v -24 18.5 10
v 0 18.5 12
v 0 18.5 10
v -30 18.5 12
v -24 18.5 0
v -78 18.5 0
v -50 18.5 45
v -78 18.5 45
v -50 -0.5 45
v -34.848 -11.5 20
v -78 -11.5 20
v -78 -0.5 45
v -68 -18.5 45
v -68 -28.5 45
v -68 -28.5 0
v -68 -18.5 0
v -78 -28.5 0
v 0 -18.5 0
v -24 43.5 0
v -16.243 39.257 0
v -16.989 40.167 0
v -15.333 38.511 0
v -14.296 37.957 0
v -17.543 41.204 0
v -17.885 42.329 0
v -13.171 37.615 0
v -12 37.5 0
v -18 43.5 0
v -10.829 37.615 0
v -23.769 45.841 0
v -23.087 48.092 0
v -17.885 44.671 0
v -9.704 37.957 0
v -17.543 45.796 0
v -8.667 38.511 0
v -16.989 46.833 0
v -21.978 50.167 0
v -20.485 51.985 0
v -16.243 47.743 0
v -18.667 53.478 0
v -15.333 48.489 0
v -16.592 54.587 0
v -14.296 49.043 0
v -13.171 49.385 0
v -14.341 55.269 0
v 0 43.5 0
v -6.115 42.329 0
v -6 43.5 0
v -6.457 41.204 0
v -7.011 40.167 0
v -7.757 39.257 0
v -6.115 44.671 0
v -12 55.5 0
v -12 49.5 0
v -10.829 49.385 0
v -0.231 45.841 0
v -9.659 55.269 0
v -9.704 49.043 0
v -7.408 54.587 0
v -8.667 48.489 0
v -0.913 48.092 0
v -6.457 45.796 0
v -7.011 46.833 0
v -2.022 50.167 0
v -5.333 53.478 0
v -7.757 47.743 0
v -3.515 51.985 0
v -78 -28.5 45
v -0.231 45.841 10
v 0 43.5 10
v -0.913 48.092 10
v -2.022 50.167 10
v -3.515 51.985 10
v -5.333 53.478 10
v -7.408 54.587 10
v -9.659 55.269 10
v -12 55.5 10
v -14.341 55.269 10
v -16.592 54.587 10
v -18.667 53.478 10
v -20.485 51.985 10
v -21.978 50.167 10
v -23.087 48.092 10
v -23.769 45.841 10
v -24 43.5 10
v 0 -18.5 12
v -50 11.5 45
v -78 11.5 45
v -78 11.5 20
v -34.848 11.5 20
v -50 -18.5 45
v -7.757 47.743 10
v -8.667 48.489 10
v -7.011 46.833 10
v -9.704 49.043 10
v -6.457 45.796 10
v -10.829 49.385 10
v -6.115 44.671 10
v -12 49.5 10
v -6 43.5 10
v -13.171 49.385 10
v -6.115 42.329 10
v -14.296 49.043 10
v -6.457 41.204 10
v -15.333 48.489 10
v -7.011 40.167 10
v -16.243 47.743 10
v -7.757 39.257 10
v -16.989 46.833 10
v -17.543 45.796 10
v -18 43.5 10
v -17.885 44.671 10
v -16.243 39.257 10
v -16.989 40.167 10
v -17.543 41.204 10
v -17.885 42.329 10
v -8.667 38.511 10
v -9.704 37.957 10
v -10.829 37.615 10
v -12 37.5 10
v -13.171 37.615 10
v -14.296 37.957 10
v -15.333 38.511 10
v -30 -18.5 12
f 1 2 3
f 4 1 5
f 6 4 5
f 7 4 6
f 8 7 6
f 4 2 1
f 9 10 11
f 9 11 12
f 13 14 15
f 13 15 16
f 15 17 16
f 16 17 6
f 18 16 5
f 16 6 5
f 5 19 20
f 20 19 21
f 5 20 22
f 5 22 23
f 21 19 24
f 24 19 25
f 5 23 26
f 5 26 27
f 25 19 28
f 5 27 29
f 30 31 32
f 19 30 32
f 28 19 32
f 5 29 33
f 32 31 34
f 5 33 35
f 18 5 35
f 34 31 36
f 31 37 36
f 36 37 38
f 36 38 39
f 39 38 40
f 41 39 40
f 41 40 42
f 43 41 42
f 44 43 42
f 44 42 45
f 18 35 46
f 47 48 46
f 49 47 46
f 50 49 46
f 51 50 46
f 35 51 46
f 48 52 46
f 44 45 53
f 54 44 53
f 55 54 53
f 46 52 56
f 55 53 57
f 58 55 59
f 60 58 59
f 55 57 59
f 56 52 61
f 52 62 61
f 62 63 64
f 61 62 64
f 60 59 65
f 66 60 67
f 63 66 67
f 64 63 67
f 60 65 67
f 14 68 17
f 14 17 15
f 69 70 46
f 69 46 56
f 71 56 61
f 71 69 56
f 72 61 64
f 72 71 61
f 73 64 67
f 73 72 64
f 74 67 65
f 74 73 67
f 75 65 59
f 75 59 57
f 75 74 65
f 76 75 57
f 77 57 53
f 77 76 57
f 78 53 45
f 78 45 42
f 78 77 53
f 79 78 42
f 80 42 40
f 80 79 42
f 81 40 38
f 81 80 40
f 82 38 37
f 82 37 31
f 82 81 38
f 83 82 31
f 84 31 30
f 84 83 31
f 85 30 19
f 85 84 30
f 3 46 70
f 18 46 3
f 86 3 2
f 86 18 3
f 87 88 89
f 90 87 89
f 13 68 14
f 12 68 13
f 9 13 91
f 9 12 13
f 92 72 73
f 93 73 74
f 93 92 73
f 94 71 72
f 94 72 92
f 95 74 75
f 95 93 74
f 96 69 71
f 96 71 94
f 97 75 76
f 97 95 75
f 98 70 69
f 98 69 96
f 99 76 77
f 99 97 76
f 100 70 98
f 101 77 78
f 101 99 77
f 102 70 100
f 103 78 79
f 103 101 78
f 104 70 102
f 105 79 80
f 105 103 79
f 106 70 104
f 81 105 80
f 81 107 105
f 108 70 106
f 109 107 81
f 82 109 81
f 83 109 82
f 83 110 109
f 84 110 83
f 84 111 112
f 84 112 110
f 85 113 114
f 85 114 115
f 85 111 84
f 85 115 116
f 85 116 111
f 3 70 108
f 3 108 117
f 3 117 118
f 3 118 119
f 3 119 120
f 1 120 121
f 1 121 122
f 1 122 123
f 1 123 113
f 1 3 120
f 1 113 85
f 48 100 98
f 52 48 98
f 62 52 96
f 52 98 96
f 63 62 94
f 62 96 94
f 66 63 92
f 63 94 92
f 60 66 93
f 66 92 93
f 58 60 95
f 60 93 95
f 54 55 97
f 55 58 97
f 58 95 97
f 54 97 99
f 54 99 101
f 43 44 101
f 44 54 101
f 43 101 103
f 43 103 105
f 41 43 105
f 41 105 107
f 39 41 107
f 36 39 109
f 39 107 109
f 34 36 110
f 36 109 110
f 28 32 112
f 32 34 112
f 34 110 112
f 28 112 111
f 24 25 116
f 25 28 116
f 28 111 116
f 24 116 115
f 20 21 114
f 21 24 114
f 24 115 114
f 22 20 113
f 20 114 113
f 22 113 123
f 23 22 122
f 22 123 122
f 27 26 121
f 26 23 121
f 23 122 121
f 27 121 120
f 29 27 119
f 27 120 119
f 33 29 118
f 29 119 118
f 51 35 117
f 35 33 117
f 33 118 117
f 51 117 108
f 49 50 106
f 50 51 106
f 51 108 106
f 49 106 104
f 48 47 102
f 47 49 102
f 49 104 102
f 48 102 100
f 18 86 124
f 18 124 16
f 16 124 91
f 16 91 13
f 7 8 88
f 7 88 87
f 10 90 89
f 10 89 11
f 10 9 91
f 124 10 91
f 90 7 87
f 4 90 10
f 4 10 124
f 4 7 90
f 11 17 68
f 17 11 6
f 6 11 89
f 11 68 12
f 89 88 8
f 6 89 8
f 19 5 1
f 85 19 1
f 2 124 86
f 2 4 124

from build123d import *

# Parameters (mm, degrees)
BOSS_EXTRUDE1_DEPTH = 18.5
CUT_EXTRUDE1_DEPTH  = 92.930680406
SKETCH3_W           = 24
SKETCH3_H           = 10
BOSS_EXTRUDE2_DEPTH = 25
SKETCH4_R           = 12
SKETCH4_R_2         = 6
BOSS_EXTRUDE4_DEPTH = 10
SKETCH5_R           = 6
CUT_EXTRUDE2_DEPTH  = 102.927670433
SKETCH6_W           = 10
SKETCH6_H           = 10
BOSS_EXTRUDE5_DEPTH = 45


with BuildPart() as part:
    # Sketch1 → Boss-Extrude1 (new, symmetric)
    with BuildSketch(Plane(origin=(0, 0, 0), x_dir=(-1, 0, 0), z_dir=(0, 1, 0))):
        Polygon((0, 0), (78, 0), (78, 45), (50, 45), (30, 12), (0, 12), align=None)
    extrude(amount=BOSS_EXTRUDE1_DEPTH, both=True)

    # Sketch2 → Cut-Extrude1 (cut, through all)
    with BuildSketch(Plane(origin=(-78, 0, 0), x_dir=(0, -1, 0), z_dir=(-1, 0, 0))):
        Polygon((0.5, 45), (-11.5, 45), (-11.5, 20), (11.5, 20), align=None)
    extrude(amount=-CUT_EXTRUDE1_DEPTH, mode=Mode.SUBTRACT)

    # Sketch3 → Boss-Extrude2 (add)
    with BuildSketch(Plane(origin=(0, 18.5, 0), x_dir=(-1, 0, 0), z_dir=(0, 1, 0))):
        with Locations((12, 5)):
            Rectangle(SKETCH3_W, SKETCH3_H)
    extrude(amount=BOSS_EXTRUDE2_DEPTH)

    # Sketch4 → Boss-Extrude4 (add)
    with BuildSketch(Plane.XY.offset(10)):
        with Locations((-12, 43.5)):
            Circle(SKETCH4_R)
        with Locations((-12, 43.5)):
            Circle(SKETCH4_R_2, mode=Mode.SUBTRACT)
    extrude(amount=-BOSS_EXTRUDE4_DEPTH)

    # Sketch5 → Cut-Extrude2 (cut, through all)
    with BuildSketch(Plane.XY.offset(10)):
        with Locations((-12, 43.5)):
            Circle(SKETCH5_R)
    extrude(amount=-CUT_EXTRUDE2_DEPTH, mode=Mode.SUBTRACT)

    # Sketch6 → Boss-Extrude5 (add)
    with BuildSketch(Plane.XY.offset(45)):
        with Locations((-73, -23.5)):
            Rectangle(SKETCH6_W, SKETCH6_H)
    extrude(amount=-BOSS_EXTRUDE5_DEPTH)


solid = part.part
